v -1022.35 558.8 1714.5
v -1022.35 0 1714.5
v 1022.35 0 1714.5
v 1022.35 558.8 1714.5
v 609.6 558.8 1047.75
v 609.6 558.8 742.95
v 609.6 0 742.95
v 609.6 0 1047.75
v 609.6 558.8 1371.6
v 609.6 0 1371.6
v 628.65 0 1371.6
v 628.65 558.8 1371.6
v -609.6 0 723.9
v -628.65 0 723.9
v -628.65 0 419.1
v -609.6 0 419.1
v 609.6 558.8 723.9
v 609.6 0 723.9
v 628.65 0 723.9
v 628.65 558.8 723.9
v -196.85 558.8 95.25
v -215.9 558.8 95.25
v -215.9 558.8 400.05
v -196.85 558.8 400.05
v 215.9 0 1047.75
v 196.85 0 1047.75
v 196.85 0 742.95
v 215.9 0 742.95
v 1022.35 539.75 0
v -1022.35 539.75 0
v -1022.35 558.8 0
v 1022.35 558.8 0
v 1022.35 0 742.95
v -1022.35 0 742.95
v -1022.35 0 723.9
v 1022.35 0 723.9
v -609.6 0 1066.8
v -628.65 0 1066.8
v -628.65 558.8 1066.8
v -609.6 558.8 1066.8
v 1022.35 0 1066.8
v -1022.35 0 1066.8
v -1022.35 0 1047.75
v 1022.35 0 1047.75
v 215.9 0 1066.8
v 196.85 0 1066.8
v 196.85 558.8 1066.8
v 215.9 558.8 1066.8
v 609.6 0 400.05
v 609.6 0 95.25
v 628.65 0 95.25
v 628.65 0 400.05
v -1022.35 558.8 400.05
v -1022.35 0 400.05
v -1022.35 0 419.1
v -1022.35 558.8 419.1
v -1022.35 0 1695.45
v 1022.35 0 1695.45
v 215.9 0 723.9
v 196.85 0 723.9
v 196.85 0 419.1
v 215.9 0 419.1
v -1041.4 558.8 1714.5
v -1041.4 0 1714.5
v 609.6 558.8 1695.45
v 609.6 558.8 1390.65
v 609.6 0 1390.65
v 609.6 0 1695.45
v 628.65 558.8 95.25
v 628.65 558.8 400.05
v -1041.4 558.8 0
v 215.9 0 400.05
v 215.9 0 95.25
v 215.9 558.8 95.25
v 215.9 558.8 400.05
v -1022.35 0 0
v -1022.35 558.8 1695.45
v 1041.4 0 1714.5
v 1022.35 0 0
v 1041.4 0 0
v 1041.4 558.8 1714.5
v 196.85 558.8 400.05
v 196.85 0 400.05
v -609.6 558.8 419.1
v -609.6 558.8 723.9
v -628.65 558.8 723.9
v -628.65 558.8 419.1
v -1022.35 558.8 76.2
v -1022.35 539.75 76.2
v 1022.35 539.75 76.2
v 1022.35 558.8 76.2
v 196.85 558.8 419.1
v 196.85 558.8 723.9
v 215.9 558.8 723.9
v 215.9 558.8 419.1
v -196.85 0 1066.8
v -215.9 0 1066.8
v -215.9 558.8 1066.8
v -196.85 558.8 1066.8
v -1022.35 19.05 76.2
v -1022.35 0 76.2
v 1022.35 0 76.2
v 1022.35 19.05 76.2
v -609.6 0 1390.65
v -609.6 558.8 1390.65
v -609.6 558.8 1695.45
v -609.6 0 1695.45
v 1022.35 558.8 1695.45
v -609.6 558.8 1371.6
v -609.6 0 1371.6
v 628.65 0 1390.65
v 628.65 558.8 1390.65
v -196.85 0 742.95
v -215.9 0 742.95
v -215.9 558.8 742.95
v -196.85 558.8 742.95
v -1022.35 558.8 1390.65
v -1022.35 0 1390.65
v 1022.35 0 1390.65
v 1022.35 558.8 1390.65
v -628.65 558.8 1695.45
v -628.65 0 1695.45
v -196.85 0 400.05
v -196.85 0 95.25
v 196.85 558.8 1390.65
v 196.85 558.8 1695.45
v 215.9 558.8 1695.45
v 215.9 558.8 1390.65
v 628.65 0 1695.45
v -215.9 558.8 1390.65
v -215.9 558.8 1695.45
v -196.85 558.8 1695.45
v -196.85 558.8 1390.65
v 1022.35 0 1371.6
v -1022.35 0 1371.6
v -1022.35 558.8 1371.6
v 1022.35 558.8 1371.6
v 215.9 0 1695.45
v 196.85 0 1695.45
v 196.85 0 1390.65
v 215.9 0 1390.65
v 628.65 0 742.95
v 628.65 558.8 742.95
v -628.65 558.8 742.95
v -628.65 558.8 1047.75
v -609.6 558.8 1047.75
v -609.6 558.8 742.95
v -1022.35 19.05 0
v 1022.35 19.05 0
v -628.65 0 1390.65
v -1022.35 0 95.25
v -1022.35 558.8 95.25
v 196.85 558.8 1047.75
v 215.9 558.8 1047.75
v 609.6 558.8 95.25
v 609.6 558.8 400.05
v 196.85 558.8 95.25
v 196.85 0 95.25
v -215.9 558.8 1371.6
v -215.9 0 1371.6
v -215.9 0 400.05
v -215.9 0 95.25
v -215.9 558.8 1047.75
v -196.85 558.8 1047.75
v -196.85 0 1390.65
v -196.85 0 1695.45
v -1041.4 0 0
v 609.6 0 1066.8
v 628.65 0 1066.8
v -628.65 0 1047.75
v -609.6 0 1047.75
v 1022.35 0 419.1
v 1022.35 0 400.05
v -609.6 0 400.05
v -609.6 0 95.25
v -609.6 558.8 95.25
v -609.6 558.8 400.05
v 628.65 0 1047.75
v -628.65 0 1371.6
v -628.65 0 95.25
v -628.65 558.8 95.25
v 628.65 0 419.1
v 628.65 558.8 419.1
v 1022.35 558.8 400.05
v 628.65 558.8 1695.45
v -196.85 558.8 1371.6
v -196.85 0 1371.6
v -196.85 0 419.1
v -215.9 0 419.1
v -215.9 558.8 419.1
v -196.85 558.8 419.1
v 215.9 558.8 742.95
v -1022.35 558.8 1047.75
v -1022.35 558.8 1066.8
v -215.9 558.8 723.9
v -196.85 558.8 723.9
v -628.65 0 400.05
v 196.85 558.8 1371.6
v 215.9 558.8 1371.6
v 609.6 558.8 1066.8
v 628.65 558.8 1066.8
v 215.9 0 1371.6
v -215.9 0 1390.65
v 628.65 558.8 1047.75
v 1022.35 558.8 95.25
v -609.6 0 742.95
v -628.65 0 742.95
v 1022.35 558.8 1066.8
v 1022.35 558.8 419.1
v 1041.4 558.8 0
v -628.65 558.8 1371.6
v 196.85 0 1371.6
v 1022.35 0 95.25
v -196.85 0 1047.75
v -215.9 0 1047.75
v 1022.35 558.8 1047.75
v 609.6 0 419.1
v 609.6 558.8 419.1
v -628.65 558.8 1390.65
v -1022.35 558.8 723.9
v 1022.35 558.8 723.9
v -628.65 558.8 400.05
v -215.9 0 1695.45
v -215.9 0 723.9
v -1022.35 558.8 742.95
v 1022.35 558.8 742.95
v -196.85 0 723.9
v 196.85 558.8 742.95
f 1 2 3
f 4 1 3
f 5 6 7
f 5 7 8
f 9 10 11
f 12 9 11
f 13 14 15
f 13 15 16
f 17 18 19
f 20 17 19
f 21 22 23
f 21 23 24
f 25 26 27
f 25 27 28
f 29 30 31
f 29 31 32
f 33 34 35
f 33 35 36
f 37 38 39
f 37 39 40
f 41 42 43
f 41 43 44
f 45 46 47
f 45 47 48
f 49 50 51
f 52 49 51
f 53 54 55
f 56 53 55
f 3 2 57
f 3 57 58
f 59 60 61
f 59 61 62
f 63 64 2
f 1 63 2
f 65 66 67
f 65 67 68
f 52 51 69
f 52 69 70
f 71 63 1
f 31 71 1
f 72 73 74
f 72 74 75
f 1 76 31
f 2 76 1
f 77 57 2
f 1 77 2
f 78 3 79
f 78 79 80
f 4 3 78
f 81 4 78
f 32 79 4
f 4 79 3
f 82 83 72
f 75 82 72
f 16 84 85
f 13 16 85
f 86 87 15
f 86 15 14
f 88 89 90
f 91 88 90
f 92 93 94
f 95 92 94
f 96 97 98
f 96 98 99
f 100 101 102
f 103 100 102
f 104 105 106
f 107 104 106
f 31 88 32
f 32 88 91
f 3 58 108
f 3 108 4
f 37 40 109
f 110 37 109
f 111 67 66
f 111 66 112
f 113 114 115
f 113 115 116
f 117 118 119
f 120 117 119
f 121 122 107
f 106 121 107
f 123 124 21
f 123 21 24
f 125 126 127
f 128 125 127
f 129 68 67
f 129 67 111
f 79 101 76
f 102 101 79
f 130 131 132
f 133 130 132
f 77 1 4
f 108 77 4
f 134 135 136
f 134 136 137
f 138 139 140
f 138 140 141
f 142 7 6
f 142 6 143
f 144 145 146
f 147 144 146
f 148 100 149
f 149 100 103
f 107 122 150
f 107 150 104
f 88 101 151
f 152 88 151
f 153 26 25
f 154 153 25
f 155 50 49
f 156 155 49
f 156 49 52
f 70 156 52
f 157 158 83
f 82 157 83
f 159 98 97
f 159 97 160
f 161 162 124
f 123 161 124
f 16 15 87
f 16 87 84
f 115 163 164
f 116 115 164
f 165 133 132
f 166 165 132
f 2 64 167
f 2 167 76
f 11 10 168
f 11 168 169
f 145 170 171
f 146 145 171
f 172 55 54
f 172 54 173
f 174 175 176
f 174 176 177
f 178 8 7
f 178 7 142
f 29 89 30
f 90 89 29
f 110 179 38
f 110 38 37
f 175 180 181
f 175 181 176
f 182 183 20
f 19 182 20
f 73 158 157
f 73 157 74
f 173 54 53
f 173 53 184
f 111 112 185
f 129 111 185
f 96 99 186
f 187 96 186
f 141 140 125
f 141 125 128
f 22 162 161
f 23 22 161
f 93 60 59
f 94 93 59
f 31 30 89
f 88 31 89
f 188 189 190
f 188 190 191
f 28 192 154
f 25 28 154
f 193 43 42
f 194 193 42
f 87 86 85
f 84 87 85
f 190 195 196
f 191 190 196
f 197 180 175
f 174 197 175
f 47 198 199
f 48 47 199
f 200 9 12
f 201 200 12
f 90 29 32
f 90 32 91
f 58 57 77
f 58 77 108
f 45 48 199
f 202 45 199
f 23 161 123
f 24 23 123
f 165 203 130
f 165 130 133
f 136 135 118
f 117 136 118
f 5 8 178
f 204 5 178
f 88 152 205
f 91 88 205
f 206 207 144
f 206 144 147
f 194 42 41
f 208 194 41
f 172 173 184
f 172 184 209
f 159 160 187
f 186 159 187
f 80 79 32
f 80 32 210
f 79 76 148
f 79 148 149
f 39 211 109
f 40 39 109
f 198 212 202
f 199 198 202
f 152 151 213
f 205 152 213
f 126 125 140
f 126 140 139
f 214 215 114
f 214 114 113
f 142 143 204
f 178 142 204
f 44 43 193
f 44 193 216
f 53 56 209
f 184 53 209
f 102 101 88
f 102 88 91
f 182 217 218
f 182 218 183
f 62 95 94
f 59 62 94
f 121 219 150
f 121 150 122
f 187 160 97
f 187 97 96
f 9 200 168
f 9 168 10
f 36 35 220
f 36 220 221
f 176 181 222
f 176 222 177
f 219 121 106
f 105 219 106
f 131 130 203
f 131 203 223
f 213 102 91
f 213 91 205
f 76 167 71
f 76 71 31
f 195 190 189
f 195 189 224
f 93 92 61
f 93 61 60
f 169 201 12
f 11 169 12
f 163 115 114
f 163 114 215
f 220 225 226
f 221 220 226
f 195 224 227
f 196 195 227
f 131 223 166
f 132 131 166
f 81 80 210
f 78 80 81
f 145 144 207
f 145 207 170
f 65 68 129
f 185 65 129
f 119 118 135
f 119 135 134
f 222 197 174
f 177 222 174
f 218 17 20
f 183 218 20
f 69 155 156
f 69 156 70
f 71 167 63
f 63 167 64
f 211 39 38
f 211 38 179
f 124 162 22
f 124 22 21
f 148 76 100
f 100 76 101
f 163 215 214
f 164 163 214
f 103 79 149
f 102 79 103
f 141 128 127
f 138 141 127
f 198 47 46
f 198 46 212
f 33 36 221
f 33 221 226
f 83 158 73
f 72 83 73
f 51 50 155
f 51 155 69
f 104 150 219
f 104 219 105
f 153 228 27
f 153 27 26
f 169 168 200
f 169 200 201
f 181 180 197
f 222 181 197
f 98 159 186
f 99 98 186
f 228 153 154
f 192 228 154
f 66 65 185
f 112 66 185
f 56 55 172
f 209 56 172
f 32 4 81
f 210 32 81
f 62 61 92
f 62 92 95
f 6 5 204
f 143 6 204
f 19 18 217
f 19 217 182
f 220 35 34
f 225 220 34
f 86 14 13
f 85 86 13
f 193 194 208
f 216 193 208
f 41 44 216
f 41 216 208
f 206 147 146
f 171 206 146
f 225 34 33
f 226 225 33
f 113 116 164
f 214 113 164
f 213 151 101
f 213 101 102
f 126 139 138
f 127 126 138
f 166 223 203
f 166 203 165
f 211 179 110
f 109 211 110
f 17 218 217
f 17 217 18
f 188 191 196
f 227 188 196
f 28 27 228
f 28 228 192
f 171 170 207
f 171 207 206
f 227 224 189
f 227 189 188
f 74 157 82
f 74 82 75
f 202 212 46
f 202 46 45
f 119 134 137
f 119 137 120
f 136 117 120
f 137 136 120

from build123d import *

# Parameters (mm, degrees)
F2_W      = 2044.7
F2_H      = 76.2
F6_DEPTH  = 19.05
F7_START  = -539.75
F7_DEPTH  = 19.05
F3_W      = 2044.7
F3_H      = 19.05
F8_DEPTH  = 558.8
F4_W      = 19.05
F4_H      = 1714.5000293255
F9_DEPTH  = 558.8
F5_W      = 19.05
F5_H      = 304.8000058651
F10_DEPTH = 558.8


# Not quite as in the source:
# - a variable given as a bare number and used for a length is read in inches; the dataset says mm whatever the document's units were


with BuildPart() as f6:
    # F2 (on Front) → F6 (new body)
    with BuildSketch(Plane.XZ):
        with Locations((0, 38.1)):
            Rectangle(F2_W, F2_H)
    extrude(amount=-F6_DEPTH)


with BuildPart() as f7:
    # F2 (on Front) → F7 (new body)
    with BuildSketch(Plane.XZ.offset(F7_START)):
        with Locations((0, 38.1)):
            Rectangle(F2_W, F2_H)
    extrude(amount=-F7_DEPTH)


with BuildPart() as f8:
    # F3 (on Front) → F8 (new body)
    with BuildSketch(Plane.XZ):
        with Locations((0, 85.725)):
            Rectangle(F3_W, F3_H)
    extrude(amount=-F8_DEPTH)


with BuildPart() as f8b:
    # F3 (on Front) → F8, piece 2 (new body)
    with BuildSketch(Plane.XZ):
        with Locations((0, 409.5750058651)):
            Rectangle(F3_W, F3_H)
    extrude(amount=-F8_DEPTH)


with BuildPart() as f8c:
    # F3 (on Front) → F8, piece 3 (new body)
    with BuildSketch(Plane.XZ):
        with Locations((0, 733.4250117302)):
            Rectangle(F3_W, F3_H)
    extrude(amount=-F8_DEPTH)


with BuildPart() as f8d:
    # F3 (on Front) → F8, piece 4 (new body)
    with BuildSketch(Plane.XZ):
        with Locations((0, 1057.2750175953)):
            Rectangle(F3_W, F3_H)
    extrude(amount=-F8_DEPTH)


with BuildPart() as f8e:
    # F3 (on Front) → F8, piece 5 (new body)
    with BuildSketch(Plane.XZ):
        with Locations((0, 1381.1250234604)):
            Rectangle(F3_W, F3_H)
    extrude(amount=-F8_DEPTH)


with BuildPart() as f8f:
    # F3 (on Front) → F8, piece 6 (new body)
    with BuildSketch(Plane.XZ):
        with Locations((0, 1704.9750293255)):
            Rectangle(F3_W, F3_H)
    extrude(amount=-F8_DEPTH)


with BuildPart() as f9:
    # F4 (on Front) → F9 (new body)
    with BuildSketch(Plane.XZ):
        with Locations((-1031.875, 857.2500146627)):
            Rectangle(F4_W, F4_H)
    extrude(amount=-F9_DEPTH)


with BuildPart() as f9b:
    # F4 (on Front) → F9, piece 2 (new body)
    with BuildSketch(Plane.XZ):
        with Locations((1031.875, 857.2500146627)):
            Rectangle(F4_W, F4_H)
    extrude(amount=-F9_DEPTH)


with BuildPart() as f10:
    # F5 (on Front) → F10 (new body)
    with BuildSketch(Plane.XZ):
        with Locations((-619.125, 247.6500029325)):
            Rectangle(F5_W, F5_H)
    extrude(amount=-F10_DEPTH)


with BuildPart() as f10b:
    # F5 (on Front) → F10, piece 2 (new body)
    with BuildSketch(Plane.XZ):
        with Locations((-619.125, 571.5000087976)):
            Rectangle(F5_W, F5_H)
    extrude(amount=-F10_DEPTH)


with BuildPart() as f10c:
    # F5 (on Front) → F10, piece 3 (new body)
    with BuildSketch(Plane.XZ):
        with Locations((-619.125, 895.3500146627)):
            Rectangle(F5_W, F5_H)
    extrude(amount=-F10_DEPTH)


with BuildPart() as f10d:
    # F5 (on Front) → F10, piece 4 (new body)
    with BuildSketch(Plane.XZ):
        with Locations((-619.125, 1219.2000205278)):
            Rectangle(F5_W, F5_H)
    extrude(amount=-F10_DEPTH)


with BuildPart() as f10e:
    # F5 (on Front) → F10, piece 5 (new body)
    with BuildSketch(Plane.XZ):
        with Locations((-619.125, 1543.0500263929)):
            Rectangle(F5_W, F5_H)
    extrude(amount=-F10_DEPTH)


with BuildPart() as f10f:
    # F5 (on Front) → F10, piece 6 (new body)
    with BuildSketch(Plane.XZ):
        with Locations((-206.374994278, 247.6500029325)):
            Rectangle(F5_W, F5_H)
    extrude(amount=-F10_DEPTH)


with BuildPart() as f10g:
    # F5 (on Front) → F10, piece 7 (new body)
    with BuildSketch(Plane.XZ):
        with Locations((-206.374994278, 571.5000087976)):
            Rectangle(F5_W, F5_H)
    extrude(amount=-F10_DEPTH)


with BuildPart() as f10h:
    # F5 (on Front) → F10, piece 8 (new body)
    with BuildSketch(Plane.XZ):
        with Locations((-206.374994278, 895.3500146627)):
            Rectangle(F5_W, F5_H)
    extrude(amount=-F10_DEPTH)


with BuildPart() as f10i:
    # F5 (on Front) → F10, piece 9 (new body)
    with BuildSketch(Plane.XZ):
        with Locations((-206.374994278, 1219.2000205278)):
            Rectangle(F5_W, F5_H)
    extrude(amount=-F10_DEPTH)


with BuildPart() as f10j:
    # F5 (on Front) → F10, piece 10 (new body)
    with BuildSketch(Plane.XZ):
        with Locations((-206.374994278, 1543.0500263929)):
            Rectangle(F5_W, F5_H)
    extrude(amount=-F10_DEPTH)


with BuildPart() as f10k:
    # F5 (on Front) → F10, piece 11 (new body)
    with BuildSketch(Plane.XZ):
        with Locations((206.3750114441, 247.6500029325)):
            Rectangle(F5_W, F5_H)
    extrude(amount=-F10_DEPTH)


with BuildPart() as f10l:
    # F5 (on Front) → F10, piece 12 (new body)
    with BuildSketch(Plane.XZ):
        with Locations((206.3750114441, 571.5000087976)):
            Rectangle(F5_W, F5_H)
    extrude(amount=-F10_DEPTH)


with BuildPart() as f10m:
    # F5 (on Front) → F10, piece 13 (new body)
    with BuildSketch(Plane.XZ):
        with Locations((206.3750114441, 895.3500146627)):
            Rectangle(F5_W, F5_H)
    extrude(amount=-F10_DEPTH)


with BuildPart() as f10n:
    # F5 (on Front) → F10, piece 14 (new body)
    with BuildSketch(Plane.XZ):
        with Locations((206.3750114441, 1219.2000205278)):
            Rectangle(F5_W, F5_H)
    extrude(amount=-F10_DEPTH)


with BuildPart() as f10o:
    # F5 (on Front) → F10, piece 15 (new body)
    with BuildSketch(Plane.XZ):
        with Locations((206.3750114441, 1543.0500263929)):
            Rectangle(F5_W, F5_H)
    extrude(amount=-F10_DEPTH)


with BuildPart() as f10p:
    # F5 (on Front) → F10, piece 16 (new body)
    with BuildSketch(Plane.XZ):
        with Locations((619.1250171661, 247.6500029325)):
            Rectangle(F5_W, F5_H)
    extrude(amount=-F10_DEPTH)


with BuildPart() as f10q:
    # F5 (on Front) → F10, piece 17 (new body)
    with BuildSketch(Plane.XZ):
        with Locations((619.1250171661, 571.5000087976)):
            Rectangle(F5_W, F5_H)
    extrude(amount=-F10_DEPTH)


with BuildPart() as f10r:
    # F5 (on Front) → F10, piece 18 (new body)
    with BuildSketch(Plane.XZ):
        with Locations((619.1250171661, 895.3500146627)):
            Rectangle(F5_W, F5_H)
    extrude(amount=-F10_DEPTH)


with BuildPart() as f10s:
    # F5 (on Front) → F10, piece 19 (new body)
    with BuildSketch(Plane.XZ):
        with Locations((619.1250171661, 1219.2000205278)):
            Rectangle(F5_W, F5_H)
    extrude(amount=-F10_DEPTH)


with BuildPart() as f10t:
    # F5 (on Front) → F10, piece 20 (new body)
    with BuildSketch(Plane.XZ):
        with Locations((619.1250171661, 1543.0500263929)):
            Rectangle(F5_W, F5_H)
    extrude(amount=-F10_DEPTH)


solid = Compound([f6.part, f7.part, f8.part, f8b.part, f8c.part, f8d.part, f8e.part, f8f.part, f9.part, f9b.part, f10.part, f10b.part, f10c.part, f10d.part, f10e.part, f10f.part, f10g.part, f10h.part, f10i.part, f10j.part, f10k.part, f10l.part, f10m.part, f10n.part, f10o.part, f10p.part, f10q.part, f10r.part, f10s.part, f10t.part])
